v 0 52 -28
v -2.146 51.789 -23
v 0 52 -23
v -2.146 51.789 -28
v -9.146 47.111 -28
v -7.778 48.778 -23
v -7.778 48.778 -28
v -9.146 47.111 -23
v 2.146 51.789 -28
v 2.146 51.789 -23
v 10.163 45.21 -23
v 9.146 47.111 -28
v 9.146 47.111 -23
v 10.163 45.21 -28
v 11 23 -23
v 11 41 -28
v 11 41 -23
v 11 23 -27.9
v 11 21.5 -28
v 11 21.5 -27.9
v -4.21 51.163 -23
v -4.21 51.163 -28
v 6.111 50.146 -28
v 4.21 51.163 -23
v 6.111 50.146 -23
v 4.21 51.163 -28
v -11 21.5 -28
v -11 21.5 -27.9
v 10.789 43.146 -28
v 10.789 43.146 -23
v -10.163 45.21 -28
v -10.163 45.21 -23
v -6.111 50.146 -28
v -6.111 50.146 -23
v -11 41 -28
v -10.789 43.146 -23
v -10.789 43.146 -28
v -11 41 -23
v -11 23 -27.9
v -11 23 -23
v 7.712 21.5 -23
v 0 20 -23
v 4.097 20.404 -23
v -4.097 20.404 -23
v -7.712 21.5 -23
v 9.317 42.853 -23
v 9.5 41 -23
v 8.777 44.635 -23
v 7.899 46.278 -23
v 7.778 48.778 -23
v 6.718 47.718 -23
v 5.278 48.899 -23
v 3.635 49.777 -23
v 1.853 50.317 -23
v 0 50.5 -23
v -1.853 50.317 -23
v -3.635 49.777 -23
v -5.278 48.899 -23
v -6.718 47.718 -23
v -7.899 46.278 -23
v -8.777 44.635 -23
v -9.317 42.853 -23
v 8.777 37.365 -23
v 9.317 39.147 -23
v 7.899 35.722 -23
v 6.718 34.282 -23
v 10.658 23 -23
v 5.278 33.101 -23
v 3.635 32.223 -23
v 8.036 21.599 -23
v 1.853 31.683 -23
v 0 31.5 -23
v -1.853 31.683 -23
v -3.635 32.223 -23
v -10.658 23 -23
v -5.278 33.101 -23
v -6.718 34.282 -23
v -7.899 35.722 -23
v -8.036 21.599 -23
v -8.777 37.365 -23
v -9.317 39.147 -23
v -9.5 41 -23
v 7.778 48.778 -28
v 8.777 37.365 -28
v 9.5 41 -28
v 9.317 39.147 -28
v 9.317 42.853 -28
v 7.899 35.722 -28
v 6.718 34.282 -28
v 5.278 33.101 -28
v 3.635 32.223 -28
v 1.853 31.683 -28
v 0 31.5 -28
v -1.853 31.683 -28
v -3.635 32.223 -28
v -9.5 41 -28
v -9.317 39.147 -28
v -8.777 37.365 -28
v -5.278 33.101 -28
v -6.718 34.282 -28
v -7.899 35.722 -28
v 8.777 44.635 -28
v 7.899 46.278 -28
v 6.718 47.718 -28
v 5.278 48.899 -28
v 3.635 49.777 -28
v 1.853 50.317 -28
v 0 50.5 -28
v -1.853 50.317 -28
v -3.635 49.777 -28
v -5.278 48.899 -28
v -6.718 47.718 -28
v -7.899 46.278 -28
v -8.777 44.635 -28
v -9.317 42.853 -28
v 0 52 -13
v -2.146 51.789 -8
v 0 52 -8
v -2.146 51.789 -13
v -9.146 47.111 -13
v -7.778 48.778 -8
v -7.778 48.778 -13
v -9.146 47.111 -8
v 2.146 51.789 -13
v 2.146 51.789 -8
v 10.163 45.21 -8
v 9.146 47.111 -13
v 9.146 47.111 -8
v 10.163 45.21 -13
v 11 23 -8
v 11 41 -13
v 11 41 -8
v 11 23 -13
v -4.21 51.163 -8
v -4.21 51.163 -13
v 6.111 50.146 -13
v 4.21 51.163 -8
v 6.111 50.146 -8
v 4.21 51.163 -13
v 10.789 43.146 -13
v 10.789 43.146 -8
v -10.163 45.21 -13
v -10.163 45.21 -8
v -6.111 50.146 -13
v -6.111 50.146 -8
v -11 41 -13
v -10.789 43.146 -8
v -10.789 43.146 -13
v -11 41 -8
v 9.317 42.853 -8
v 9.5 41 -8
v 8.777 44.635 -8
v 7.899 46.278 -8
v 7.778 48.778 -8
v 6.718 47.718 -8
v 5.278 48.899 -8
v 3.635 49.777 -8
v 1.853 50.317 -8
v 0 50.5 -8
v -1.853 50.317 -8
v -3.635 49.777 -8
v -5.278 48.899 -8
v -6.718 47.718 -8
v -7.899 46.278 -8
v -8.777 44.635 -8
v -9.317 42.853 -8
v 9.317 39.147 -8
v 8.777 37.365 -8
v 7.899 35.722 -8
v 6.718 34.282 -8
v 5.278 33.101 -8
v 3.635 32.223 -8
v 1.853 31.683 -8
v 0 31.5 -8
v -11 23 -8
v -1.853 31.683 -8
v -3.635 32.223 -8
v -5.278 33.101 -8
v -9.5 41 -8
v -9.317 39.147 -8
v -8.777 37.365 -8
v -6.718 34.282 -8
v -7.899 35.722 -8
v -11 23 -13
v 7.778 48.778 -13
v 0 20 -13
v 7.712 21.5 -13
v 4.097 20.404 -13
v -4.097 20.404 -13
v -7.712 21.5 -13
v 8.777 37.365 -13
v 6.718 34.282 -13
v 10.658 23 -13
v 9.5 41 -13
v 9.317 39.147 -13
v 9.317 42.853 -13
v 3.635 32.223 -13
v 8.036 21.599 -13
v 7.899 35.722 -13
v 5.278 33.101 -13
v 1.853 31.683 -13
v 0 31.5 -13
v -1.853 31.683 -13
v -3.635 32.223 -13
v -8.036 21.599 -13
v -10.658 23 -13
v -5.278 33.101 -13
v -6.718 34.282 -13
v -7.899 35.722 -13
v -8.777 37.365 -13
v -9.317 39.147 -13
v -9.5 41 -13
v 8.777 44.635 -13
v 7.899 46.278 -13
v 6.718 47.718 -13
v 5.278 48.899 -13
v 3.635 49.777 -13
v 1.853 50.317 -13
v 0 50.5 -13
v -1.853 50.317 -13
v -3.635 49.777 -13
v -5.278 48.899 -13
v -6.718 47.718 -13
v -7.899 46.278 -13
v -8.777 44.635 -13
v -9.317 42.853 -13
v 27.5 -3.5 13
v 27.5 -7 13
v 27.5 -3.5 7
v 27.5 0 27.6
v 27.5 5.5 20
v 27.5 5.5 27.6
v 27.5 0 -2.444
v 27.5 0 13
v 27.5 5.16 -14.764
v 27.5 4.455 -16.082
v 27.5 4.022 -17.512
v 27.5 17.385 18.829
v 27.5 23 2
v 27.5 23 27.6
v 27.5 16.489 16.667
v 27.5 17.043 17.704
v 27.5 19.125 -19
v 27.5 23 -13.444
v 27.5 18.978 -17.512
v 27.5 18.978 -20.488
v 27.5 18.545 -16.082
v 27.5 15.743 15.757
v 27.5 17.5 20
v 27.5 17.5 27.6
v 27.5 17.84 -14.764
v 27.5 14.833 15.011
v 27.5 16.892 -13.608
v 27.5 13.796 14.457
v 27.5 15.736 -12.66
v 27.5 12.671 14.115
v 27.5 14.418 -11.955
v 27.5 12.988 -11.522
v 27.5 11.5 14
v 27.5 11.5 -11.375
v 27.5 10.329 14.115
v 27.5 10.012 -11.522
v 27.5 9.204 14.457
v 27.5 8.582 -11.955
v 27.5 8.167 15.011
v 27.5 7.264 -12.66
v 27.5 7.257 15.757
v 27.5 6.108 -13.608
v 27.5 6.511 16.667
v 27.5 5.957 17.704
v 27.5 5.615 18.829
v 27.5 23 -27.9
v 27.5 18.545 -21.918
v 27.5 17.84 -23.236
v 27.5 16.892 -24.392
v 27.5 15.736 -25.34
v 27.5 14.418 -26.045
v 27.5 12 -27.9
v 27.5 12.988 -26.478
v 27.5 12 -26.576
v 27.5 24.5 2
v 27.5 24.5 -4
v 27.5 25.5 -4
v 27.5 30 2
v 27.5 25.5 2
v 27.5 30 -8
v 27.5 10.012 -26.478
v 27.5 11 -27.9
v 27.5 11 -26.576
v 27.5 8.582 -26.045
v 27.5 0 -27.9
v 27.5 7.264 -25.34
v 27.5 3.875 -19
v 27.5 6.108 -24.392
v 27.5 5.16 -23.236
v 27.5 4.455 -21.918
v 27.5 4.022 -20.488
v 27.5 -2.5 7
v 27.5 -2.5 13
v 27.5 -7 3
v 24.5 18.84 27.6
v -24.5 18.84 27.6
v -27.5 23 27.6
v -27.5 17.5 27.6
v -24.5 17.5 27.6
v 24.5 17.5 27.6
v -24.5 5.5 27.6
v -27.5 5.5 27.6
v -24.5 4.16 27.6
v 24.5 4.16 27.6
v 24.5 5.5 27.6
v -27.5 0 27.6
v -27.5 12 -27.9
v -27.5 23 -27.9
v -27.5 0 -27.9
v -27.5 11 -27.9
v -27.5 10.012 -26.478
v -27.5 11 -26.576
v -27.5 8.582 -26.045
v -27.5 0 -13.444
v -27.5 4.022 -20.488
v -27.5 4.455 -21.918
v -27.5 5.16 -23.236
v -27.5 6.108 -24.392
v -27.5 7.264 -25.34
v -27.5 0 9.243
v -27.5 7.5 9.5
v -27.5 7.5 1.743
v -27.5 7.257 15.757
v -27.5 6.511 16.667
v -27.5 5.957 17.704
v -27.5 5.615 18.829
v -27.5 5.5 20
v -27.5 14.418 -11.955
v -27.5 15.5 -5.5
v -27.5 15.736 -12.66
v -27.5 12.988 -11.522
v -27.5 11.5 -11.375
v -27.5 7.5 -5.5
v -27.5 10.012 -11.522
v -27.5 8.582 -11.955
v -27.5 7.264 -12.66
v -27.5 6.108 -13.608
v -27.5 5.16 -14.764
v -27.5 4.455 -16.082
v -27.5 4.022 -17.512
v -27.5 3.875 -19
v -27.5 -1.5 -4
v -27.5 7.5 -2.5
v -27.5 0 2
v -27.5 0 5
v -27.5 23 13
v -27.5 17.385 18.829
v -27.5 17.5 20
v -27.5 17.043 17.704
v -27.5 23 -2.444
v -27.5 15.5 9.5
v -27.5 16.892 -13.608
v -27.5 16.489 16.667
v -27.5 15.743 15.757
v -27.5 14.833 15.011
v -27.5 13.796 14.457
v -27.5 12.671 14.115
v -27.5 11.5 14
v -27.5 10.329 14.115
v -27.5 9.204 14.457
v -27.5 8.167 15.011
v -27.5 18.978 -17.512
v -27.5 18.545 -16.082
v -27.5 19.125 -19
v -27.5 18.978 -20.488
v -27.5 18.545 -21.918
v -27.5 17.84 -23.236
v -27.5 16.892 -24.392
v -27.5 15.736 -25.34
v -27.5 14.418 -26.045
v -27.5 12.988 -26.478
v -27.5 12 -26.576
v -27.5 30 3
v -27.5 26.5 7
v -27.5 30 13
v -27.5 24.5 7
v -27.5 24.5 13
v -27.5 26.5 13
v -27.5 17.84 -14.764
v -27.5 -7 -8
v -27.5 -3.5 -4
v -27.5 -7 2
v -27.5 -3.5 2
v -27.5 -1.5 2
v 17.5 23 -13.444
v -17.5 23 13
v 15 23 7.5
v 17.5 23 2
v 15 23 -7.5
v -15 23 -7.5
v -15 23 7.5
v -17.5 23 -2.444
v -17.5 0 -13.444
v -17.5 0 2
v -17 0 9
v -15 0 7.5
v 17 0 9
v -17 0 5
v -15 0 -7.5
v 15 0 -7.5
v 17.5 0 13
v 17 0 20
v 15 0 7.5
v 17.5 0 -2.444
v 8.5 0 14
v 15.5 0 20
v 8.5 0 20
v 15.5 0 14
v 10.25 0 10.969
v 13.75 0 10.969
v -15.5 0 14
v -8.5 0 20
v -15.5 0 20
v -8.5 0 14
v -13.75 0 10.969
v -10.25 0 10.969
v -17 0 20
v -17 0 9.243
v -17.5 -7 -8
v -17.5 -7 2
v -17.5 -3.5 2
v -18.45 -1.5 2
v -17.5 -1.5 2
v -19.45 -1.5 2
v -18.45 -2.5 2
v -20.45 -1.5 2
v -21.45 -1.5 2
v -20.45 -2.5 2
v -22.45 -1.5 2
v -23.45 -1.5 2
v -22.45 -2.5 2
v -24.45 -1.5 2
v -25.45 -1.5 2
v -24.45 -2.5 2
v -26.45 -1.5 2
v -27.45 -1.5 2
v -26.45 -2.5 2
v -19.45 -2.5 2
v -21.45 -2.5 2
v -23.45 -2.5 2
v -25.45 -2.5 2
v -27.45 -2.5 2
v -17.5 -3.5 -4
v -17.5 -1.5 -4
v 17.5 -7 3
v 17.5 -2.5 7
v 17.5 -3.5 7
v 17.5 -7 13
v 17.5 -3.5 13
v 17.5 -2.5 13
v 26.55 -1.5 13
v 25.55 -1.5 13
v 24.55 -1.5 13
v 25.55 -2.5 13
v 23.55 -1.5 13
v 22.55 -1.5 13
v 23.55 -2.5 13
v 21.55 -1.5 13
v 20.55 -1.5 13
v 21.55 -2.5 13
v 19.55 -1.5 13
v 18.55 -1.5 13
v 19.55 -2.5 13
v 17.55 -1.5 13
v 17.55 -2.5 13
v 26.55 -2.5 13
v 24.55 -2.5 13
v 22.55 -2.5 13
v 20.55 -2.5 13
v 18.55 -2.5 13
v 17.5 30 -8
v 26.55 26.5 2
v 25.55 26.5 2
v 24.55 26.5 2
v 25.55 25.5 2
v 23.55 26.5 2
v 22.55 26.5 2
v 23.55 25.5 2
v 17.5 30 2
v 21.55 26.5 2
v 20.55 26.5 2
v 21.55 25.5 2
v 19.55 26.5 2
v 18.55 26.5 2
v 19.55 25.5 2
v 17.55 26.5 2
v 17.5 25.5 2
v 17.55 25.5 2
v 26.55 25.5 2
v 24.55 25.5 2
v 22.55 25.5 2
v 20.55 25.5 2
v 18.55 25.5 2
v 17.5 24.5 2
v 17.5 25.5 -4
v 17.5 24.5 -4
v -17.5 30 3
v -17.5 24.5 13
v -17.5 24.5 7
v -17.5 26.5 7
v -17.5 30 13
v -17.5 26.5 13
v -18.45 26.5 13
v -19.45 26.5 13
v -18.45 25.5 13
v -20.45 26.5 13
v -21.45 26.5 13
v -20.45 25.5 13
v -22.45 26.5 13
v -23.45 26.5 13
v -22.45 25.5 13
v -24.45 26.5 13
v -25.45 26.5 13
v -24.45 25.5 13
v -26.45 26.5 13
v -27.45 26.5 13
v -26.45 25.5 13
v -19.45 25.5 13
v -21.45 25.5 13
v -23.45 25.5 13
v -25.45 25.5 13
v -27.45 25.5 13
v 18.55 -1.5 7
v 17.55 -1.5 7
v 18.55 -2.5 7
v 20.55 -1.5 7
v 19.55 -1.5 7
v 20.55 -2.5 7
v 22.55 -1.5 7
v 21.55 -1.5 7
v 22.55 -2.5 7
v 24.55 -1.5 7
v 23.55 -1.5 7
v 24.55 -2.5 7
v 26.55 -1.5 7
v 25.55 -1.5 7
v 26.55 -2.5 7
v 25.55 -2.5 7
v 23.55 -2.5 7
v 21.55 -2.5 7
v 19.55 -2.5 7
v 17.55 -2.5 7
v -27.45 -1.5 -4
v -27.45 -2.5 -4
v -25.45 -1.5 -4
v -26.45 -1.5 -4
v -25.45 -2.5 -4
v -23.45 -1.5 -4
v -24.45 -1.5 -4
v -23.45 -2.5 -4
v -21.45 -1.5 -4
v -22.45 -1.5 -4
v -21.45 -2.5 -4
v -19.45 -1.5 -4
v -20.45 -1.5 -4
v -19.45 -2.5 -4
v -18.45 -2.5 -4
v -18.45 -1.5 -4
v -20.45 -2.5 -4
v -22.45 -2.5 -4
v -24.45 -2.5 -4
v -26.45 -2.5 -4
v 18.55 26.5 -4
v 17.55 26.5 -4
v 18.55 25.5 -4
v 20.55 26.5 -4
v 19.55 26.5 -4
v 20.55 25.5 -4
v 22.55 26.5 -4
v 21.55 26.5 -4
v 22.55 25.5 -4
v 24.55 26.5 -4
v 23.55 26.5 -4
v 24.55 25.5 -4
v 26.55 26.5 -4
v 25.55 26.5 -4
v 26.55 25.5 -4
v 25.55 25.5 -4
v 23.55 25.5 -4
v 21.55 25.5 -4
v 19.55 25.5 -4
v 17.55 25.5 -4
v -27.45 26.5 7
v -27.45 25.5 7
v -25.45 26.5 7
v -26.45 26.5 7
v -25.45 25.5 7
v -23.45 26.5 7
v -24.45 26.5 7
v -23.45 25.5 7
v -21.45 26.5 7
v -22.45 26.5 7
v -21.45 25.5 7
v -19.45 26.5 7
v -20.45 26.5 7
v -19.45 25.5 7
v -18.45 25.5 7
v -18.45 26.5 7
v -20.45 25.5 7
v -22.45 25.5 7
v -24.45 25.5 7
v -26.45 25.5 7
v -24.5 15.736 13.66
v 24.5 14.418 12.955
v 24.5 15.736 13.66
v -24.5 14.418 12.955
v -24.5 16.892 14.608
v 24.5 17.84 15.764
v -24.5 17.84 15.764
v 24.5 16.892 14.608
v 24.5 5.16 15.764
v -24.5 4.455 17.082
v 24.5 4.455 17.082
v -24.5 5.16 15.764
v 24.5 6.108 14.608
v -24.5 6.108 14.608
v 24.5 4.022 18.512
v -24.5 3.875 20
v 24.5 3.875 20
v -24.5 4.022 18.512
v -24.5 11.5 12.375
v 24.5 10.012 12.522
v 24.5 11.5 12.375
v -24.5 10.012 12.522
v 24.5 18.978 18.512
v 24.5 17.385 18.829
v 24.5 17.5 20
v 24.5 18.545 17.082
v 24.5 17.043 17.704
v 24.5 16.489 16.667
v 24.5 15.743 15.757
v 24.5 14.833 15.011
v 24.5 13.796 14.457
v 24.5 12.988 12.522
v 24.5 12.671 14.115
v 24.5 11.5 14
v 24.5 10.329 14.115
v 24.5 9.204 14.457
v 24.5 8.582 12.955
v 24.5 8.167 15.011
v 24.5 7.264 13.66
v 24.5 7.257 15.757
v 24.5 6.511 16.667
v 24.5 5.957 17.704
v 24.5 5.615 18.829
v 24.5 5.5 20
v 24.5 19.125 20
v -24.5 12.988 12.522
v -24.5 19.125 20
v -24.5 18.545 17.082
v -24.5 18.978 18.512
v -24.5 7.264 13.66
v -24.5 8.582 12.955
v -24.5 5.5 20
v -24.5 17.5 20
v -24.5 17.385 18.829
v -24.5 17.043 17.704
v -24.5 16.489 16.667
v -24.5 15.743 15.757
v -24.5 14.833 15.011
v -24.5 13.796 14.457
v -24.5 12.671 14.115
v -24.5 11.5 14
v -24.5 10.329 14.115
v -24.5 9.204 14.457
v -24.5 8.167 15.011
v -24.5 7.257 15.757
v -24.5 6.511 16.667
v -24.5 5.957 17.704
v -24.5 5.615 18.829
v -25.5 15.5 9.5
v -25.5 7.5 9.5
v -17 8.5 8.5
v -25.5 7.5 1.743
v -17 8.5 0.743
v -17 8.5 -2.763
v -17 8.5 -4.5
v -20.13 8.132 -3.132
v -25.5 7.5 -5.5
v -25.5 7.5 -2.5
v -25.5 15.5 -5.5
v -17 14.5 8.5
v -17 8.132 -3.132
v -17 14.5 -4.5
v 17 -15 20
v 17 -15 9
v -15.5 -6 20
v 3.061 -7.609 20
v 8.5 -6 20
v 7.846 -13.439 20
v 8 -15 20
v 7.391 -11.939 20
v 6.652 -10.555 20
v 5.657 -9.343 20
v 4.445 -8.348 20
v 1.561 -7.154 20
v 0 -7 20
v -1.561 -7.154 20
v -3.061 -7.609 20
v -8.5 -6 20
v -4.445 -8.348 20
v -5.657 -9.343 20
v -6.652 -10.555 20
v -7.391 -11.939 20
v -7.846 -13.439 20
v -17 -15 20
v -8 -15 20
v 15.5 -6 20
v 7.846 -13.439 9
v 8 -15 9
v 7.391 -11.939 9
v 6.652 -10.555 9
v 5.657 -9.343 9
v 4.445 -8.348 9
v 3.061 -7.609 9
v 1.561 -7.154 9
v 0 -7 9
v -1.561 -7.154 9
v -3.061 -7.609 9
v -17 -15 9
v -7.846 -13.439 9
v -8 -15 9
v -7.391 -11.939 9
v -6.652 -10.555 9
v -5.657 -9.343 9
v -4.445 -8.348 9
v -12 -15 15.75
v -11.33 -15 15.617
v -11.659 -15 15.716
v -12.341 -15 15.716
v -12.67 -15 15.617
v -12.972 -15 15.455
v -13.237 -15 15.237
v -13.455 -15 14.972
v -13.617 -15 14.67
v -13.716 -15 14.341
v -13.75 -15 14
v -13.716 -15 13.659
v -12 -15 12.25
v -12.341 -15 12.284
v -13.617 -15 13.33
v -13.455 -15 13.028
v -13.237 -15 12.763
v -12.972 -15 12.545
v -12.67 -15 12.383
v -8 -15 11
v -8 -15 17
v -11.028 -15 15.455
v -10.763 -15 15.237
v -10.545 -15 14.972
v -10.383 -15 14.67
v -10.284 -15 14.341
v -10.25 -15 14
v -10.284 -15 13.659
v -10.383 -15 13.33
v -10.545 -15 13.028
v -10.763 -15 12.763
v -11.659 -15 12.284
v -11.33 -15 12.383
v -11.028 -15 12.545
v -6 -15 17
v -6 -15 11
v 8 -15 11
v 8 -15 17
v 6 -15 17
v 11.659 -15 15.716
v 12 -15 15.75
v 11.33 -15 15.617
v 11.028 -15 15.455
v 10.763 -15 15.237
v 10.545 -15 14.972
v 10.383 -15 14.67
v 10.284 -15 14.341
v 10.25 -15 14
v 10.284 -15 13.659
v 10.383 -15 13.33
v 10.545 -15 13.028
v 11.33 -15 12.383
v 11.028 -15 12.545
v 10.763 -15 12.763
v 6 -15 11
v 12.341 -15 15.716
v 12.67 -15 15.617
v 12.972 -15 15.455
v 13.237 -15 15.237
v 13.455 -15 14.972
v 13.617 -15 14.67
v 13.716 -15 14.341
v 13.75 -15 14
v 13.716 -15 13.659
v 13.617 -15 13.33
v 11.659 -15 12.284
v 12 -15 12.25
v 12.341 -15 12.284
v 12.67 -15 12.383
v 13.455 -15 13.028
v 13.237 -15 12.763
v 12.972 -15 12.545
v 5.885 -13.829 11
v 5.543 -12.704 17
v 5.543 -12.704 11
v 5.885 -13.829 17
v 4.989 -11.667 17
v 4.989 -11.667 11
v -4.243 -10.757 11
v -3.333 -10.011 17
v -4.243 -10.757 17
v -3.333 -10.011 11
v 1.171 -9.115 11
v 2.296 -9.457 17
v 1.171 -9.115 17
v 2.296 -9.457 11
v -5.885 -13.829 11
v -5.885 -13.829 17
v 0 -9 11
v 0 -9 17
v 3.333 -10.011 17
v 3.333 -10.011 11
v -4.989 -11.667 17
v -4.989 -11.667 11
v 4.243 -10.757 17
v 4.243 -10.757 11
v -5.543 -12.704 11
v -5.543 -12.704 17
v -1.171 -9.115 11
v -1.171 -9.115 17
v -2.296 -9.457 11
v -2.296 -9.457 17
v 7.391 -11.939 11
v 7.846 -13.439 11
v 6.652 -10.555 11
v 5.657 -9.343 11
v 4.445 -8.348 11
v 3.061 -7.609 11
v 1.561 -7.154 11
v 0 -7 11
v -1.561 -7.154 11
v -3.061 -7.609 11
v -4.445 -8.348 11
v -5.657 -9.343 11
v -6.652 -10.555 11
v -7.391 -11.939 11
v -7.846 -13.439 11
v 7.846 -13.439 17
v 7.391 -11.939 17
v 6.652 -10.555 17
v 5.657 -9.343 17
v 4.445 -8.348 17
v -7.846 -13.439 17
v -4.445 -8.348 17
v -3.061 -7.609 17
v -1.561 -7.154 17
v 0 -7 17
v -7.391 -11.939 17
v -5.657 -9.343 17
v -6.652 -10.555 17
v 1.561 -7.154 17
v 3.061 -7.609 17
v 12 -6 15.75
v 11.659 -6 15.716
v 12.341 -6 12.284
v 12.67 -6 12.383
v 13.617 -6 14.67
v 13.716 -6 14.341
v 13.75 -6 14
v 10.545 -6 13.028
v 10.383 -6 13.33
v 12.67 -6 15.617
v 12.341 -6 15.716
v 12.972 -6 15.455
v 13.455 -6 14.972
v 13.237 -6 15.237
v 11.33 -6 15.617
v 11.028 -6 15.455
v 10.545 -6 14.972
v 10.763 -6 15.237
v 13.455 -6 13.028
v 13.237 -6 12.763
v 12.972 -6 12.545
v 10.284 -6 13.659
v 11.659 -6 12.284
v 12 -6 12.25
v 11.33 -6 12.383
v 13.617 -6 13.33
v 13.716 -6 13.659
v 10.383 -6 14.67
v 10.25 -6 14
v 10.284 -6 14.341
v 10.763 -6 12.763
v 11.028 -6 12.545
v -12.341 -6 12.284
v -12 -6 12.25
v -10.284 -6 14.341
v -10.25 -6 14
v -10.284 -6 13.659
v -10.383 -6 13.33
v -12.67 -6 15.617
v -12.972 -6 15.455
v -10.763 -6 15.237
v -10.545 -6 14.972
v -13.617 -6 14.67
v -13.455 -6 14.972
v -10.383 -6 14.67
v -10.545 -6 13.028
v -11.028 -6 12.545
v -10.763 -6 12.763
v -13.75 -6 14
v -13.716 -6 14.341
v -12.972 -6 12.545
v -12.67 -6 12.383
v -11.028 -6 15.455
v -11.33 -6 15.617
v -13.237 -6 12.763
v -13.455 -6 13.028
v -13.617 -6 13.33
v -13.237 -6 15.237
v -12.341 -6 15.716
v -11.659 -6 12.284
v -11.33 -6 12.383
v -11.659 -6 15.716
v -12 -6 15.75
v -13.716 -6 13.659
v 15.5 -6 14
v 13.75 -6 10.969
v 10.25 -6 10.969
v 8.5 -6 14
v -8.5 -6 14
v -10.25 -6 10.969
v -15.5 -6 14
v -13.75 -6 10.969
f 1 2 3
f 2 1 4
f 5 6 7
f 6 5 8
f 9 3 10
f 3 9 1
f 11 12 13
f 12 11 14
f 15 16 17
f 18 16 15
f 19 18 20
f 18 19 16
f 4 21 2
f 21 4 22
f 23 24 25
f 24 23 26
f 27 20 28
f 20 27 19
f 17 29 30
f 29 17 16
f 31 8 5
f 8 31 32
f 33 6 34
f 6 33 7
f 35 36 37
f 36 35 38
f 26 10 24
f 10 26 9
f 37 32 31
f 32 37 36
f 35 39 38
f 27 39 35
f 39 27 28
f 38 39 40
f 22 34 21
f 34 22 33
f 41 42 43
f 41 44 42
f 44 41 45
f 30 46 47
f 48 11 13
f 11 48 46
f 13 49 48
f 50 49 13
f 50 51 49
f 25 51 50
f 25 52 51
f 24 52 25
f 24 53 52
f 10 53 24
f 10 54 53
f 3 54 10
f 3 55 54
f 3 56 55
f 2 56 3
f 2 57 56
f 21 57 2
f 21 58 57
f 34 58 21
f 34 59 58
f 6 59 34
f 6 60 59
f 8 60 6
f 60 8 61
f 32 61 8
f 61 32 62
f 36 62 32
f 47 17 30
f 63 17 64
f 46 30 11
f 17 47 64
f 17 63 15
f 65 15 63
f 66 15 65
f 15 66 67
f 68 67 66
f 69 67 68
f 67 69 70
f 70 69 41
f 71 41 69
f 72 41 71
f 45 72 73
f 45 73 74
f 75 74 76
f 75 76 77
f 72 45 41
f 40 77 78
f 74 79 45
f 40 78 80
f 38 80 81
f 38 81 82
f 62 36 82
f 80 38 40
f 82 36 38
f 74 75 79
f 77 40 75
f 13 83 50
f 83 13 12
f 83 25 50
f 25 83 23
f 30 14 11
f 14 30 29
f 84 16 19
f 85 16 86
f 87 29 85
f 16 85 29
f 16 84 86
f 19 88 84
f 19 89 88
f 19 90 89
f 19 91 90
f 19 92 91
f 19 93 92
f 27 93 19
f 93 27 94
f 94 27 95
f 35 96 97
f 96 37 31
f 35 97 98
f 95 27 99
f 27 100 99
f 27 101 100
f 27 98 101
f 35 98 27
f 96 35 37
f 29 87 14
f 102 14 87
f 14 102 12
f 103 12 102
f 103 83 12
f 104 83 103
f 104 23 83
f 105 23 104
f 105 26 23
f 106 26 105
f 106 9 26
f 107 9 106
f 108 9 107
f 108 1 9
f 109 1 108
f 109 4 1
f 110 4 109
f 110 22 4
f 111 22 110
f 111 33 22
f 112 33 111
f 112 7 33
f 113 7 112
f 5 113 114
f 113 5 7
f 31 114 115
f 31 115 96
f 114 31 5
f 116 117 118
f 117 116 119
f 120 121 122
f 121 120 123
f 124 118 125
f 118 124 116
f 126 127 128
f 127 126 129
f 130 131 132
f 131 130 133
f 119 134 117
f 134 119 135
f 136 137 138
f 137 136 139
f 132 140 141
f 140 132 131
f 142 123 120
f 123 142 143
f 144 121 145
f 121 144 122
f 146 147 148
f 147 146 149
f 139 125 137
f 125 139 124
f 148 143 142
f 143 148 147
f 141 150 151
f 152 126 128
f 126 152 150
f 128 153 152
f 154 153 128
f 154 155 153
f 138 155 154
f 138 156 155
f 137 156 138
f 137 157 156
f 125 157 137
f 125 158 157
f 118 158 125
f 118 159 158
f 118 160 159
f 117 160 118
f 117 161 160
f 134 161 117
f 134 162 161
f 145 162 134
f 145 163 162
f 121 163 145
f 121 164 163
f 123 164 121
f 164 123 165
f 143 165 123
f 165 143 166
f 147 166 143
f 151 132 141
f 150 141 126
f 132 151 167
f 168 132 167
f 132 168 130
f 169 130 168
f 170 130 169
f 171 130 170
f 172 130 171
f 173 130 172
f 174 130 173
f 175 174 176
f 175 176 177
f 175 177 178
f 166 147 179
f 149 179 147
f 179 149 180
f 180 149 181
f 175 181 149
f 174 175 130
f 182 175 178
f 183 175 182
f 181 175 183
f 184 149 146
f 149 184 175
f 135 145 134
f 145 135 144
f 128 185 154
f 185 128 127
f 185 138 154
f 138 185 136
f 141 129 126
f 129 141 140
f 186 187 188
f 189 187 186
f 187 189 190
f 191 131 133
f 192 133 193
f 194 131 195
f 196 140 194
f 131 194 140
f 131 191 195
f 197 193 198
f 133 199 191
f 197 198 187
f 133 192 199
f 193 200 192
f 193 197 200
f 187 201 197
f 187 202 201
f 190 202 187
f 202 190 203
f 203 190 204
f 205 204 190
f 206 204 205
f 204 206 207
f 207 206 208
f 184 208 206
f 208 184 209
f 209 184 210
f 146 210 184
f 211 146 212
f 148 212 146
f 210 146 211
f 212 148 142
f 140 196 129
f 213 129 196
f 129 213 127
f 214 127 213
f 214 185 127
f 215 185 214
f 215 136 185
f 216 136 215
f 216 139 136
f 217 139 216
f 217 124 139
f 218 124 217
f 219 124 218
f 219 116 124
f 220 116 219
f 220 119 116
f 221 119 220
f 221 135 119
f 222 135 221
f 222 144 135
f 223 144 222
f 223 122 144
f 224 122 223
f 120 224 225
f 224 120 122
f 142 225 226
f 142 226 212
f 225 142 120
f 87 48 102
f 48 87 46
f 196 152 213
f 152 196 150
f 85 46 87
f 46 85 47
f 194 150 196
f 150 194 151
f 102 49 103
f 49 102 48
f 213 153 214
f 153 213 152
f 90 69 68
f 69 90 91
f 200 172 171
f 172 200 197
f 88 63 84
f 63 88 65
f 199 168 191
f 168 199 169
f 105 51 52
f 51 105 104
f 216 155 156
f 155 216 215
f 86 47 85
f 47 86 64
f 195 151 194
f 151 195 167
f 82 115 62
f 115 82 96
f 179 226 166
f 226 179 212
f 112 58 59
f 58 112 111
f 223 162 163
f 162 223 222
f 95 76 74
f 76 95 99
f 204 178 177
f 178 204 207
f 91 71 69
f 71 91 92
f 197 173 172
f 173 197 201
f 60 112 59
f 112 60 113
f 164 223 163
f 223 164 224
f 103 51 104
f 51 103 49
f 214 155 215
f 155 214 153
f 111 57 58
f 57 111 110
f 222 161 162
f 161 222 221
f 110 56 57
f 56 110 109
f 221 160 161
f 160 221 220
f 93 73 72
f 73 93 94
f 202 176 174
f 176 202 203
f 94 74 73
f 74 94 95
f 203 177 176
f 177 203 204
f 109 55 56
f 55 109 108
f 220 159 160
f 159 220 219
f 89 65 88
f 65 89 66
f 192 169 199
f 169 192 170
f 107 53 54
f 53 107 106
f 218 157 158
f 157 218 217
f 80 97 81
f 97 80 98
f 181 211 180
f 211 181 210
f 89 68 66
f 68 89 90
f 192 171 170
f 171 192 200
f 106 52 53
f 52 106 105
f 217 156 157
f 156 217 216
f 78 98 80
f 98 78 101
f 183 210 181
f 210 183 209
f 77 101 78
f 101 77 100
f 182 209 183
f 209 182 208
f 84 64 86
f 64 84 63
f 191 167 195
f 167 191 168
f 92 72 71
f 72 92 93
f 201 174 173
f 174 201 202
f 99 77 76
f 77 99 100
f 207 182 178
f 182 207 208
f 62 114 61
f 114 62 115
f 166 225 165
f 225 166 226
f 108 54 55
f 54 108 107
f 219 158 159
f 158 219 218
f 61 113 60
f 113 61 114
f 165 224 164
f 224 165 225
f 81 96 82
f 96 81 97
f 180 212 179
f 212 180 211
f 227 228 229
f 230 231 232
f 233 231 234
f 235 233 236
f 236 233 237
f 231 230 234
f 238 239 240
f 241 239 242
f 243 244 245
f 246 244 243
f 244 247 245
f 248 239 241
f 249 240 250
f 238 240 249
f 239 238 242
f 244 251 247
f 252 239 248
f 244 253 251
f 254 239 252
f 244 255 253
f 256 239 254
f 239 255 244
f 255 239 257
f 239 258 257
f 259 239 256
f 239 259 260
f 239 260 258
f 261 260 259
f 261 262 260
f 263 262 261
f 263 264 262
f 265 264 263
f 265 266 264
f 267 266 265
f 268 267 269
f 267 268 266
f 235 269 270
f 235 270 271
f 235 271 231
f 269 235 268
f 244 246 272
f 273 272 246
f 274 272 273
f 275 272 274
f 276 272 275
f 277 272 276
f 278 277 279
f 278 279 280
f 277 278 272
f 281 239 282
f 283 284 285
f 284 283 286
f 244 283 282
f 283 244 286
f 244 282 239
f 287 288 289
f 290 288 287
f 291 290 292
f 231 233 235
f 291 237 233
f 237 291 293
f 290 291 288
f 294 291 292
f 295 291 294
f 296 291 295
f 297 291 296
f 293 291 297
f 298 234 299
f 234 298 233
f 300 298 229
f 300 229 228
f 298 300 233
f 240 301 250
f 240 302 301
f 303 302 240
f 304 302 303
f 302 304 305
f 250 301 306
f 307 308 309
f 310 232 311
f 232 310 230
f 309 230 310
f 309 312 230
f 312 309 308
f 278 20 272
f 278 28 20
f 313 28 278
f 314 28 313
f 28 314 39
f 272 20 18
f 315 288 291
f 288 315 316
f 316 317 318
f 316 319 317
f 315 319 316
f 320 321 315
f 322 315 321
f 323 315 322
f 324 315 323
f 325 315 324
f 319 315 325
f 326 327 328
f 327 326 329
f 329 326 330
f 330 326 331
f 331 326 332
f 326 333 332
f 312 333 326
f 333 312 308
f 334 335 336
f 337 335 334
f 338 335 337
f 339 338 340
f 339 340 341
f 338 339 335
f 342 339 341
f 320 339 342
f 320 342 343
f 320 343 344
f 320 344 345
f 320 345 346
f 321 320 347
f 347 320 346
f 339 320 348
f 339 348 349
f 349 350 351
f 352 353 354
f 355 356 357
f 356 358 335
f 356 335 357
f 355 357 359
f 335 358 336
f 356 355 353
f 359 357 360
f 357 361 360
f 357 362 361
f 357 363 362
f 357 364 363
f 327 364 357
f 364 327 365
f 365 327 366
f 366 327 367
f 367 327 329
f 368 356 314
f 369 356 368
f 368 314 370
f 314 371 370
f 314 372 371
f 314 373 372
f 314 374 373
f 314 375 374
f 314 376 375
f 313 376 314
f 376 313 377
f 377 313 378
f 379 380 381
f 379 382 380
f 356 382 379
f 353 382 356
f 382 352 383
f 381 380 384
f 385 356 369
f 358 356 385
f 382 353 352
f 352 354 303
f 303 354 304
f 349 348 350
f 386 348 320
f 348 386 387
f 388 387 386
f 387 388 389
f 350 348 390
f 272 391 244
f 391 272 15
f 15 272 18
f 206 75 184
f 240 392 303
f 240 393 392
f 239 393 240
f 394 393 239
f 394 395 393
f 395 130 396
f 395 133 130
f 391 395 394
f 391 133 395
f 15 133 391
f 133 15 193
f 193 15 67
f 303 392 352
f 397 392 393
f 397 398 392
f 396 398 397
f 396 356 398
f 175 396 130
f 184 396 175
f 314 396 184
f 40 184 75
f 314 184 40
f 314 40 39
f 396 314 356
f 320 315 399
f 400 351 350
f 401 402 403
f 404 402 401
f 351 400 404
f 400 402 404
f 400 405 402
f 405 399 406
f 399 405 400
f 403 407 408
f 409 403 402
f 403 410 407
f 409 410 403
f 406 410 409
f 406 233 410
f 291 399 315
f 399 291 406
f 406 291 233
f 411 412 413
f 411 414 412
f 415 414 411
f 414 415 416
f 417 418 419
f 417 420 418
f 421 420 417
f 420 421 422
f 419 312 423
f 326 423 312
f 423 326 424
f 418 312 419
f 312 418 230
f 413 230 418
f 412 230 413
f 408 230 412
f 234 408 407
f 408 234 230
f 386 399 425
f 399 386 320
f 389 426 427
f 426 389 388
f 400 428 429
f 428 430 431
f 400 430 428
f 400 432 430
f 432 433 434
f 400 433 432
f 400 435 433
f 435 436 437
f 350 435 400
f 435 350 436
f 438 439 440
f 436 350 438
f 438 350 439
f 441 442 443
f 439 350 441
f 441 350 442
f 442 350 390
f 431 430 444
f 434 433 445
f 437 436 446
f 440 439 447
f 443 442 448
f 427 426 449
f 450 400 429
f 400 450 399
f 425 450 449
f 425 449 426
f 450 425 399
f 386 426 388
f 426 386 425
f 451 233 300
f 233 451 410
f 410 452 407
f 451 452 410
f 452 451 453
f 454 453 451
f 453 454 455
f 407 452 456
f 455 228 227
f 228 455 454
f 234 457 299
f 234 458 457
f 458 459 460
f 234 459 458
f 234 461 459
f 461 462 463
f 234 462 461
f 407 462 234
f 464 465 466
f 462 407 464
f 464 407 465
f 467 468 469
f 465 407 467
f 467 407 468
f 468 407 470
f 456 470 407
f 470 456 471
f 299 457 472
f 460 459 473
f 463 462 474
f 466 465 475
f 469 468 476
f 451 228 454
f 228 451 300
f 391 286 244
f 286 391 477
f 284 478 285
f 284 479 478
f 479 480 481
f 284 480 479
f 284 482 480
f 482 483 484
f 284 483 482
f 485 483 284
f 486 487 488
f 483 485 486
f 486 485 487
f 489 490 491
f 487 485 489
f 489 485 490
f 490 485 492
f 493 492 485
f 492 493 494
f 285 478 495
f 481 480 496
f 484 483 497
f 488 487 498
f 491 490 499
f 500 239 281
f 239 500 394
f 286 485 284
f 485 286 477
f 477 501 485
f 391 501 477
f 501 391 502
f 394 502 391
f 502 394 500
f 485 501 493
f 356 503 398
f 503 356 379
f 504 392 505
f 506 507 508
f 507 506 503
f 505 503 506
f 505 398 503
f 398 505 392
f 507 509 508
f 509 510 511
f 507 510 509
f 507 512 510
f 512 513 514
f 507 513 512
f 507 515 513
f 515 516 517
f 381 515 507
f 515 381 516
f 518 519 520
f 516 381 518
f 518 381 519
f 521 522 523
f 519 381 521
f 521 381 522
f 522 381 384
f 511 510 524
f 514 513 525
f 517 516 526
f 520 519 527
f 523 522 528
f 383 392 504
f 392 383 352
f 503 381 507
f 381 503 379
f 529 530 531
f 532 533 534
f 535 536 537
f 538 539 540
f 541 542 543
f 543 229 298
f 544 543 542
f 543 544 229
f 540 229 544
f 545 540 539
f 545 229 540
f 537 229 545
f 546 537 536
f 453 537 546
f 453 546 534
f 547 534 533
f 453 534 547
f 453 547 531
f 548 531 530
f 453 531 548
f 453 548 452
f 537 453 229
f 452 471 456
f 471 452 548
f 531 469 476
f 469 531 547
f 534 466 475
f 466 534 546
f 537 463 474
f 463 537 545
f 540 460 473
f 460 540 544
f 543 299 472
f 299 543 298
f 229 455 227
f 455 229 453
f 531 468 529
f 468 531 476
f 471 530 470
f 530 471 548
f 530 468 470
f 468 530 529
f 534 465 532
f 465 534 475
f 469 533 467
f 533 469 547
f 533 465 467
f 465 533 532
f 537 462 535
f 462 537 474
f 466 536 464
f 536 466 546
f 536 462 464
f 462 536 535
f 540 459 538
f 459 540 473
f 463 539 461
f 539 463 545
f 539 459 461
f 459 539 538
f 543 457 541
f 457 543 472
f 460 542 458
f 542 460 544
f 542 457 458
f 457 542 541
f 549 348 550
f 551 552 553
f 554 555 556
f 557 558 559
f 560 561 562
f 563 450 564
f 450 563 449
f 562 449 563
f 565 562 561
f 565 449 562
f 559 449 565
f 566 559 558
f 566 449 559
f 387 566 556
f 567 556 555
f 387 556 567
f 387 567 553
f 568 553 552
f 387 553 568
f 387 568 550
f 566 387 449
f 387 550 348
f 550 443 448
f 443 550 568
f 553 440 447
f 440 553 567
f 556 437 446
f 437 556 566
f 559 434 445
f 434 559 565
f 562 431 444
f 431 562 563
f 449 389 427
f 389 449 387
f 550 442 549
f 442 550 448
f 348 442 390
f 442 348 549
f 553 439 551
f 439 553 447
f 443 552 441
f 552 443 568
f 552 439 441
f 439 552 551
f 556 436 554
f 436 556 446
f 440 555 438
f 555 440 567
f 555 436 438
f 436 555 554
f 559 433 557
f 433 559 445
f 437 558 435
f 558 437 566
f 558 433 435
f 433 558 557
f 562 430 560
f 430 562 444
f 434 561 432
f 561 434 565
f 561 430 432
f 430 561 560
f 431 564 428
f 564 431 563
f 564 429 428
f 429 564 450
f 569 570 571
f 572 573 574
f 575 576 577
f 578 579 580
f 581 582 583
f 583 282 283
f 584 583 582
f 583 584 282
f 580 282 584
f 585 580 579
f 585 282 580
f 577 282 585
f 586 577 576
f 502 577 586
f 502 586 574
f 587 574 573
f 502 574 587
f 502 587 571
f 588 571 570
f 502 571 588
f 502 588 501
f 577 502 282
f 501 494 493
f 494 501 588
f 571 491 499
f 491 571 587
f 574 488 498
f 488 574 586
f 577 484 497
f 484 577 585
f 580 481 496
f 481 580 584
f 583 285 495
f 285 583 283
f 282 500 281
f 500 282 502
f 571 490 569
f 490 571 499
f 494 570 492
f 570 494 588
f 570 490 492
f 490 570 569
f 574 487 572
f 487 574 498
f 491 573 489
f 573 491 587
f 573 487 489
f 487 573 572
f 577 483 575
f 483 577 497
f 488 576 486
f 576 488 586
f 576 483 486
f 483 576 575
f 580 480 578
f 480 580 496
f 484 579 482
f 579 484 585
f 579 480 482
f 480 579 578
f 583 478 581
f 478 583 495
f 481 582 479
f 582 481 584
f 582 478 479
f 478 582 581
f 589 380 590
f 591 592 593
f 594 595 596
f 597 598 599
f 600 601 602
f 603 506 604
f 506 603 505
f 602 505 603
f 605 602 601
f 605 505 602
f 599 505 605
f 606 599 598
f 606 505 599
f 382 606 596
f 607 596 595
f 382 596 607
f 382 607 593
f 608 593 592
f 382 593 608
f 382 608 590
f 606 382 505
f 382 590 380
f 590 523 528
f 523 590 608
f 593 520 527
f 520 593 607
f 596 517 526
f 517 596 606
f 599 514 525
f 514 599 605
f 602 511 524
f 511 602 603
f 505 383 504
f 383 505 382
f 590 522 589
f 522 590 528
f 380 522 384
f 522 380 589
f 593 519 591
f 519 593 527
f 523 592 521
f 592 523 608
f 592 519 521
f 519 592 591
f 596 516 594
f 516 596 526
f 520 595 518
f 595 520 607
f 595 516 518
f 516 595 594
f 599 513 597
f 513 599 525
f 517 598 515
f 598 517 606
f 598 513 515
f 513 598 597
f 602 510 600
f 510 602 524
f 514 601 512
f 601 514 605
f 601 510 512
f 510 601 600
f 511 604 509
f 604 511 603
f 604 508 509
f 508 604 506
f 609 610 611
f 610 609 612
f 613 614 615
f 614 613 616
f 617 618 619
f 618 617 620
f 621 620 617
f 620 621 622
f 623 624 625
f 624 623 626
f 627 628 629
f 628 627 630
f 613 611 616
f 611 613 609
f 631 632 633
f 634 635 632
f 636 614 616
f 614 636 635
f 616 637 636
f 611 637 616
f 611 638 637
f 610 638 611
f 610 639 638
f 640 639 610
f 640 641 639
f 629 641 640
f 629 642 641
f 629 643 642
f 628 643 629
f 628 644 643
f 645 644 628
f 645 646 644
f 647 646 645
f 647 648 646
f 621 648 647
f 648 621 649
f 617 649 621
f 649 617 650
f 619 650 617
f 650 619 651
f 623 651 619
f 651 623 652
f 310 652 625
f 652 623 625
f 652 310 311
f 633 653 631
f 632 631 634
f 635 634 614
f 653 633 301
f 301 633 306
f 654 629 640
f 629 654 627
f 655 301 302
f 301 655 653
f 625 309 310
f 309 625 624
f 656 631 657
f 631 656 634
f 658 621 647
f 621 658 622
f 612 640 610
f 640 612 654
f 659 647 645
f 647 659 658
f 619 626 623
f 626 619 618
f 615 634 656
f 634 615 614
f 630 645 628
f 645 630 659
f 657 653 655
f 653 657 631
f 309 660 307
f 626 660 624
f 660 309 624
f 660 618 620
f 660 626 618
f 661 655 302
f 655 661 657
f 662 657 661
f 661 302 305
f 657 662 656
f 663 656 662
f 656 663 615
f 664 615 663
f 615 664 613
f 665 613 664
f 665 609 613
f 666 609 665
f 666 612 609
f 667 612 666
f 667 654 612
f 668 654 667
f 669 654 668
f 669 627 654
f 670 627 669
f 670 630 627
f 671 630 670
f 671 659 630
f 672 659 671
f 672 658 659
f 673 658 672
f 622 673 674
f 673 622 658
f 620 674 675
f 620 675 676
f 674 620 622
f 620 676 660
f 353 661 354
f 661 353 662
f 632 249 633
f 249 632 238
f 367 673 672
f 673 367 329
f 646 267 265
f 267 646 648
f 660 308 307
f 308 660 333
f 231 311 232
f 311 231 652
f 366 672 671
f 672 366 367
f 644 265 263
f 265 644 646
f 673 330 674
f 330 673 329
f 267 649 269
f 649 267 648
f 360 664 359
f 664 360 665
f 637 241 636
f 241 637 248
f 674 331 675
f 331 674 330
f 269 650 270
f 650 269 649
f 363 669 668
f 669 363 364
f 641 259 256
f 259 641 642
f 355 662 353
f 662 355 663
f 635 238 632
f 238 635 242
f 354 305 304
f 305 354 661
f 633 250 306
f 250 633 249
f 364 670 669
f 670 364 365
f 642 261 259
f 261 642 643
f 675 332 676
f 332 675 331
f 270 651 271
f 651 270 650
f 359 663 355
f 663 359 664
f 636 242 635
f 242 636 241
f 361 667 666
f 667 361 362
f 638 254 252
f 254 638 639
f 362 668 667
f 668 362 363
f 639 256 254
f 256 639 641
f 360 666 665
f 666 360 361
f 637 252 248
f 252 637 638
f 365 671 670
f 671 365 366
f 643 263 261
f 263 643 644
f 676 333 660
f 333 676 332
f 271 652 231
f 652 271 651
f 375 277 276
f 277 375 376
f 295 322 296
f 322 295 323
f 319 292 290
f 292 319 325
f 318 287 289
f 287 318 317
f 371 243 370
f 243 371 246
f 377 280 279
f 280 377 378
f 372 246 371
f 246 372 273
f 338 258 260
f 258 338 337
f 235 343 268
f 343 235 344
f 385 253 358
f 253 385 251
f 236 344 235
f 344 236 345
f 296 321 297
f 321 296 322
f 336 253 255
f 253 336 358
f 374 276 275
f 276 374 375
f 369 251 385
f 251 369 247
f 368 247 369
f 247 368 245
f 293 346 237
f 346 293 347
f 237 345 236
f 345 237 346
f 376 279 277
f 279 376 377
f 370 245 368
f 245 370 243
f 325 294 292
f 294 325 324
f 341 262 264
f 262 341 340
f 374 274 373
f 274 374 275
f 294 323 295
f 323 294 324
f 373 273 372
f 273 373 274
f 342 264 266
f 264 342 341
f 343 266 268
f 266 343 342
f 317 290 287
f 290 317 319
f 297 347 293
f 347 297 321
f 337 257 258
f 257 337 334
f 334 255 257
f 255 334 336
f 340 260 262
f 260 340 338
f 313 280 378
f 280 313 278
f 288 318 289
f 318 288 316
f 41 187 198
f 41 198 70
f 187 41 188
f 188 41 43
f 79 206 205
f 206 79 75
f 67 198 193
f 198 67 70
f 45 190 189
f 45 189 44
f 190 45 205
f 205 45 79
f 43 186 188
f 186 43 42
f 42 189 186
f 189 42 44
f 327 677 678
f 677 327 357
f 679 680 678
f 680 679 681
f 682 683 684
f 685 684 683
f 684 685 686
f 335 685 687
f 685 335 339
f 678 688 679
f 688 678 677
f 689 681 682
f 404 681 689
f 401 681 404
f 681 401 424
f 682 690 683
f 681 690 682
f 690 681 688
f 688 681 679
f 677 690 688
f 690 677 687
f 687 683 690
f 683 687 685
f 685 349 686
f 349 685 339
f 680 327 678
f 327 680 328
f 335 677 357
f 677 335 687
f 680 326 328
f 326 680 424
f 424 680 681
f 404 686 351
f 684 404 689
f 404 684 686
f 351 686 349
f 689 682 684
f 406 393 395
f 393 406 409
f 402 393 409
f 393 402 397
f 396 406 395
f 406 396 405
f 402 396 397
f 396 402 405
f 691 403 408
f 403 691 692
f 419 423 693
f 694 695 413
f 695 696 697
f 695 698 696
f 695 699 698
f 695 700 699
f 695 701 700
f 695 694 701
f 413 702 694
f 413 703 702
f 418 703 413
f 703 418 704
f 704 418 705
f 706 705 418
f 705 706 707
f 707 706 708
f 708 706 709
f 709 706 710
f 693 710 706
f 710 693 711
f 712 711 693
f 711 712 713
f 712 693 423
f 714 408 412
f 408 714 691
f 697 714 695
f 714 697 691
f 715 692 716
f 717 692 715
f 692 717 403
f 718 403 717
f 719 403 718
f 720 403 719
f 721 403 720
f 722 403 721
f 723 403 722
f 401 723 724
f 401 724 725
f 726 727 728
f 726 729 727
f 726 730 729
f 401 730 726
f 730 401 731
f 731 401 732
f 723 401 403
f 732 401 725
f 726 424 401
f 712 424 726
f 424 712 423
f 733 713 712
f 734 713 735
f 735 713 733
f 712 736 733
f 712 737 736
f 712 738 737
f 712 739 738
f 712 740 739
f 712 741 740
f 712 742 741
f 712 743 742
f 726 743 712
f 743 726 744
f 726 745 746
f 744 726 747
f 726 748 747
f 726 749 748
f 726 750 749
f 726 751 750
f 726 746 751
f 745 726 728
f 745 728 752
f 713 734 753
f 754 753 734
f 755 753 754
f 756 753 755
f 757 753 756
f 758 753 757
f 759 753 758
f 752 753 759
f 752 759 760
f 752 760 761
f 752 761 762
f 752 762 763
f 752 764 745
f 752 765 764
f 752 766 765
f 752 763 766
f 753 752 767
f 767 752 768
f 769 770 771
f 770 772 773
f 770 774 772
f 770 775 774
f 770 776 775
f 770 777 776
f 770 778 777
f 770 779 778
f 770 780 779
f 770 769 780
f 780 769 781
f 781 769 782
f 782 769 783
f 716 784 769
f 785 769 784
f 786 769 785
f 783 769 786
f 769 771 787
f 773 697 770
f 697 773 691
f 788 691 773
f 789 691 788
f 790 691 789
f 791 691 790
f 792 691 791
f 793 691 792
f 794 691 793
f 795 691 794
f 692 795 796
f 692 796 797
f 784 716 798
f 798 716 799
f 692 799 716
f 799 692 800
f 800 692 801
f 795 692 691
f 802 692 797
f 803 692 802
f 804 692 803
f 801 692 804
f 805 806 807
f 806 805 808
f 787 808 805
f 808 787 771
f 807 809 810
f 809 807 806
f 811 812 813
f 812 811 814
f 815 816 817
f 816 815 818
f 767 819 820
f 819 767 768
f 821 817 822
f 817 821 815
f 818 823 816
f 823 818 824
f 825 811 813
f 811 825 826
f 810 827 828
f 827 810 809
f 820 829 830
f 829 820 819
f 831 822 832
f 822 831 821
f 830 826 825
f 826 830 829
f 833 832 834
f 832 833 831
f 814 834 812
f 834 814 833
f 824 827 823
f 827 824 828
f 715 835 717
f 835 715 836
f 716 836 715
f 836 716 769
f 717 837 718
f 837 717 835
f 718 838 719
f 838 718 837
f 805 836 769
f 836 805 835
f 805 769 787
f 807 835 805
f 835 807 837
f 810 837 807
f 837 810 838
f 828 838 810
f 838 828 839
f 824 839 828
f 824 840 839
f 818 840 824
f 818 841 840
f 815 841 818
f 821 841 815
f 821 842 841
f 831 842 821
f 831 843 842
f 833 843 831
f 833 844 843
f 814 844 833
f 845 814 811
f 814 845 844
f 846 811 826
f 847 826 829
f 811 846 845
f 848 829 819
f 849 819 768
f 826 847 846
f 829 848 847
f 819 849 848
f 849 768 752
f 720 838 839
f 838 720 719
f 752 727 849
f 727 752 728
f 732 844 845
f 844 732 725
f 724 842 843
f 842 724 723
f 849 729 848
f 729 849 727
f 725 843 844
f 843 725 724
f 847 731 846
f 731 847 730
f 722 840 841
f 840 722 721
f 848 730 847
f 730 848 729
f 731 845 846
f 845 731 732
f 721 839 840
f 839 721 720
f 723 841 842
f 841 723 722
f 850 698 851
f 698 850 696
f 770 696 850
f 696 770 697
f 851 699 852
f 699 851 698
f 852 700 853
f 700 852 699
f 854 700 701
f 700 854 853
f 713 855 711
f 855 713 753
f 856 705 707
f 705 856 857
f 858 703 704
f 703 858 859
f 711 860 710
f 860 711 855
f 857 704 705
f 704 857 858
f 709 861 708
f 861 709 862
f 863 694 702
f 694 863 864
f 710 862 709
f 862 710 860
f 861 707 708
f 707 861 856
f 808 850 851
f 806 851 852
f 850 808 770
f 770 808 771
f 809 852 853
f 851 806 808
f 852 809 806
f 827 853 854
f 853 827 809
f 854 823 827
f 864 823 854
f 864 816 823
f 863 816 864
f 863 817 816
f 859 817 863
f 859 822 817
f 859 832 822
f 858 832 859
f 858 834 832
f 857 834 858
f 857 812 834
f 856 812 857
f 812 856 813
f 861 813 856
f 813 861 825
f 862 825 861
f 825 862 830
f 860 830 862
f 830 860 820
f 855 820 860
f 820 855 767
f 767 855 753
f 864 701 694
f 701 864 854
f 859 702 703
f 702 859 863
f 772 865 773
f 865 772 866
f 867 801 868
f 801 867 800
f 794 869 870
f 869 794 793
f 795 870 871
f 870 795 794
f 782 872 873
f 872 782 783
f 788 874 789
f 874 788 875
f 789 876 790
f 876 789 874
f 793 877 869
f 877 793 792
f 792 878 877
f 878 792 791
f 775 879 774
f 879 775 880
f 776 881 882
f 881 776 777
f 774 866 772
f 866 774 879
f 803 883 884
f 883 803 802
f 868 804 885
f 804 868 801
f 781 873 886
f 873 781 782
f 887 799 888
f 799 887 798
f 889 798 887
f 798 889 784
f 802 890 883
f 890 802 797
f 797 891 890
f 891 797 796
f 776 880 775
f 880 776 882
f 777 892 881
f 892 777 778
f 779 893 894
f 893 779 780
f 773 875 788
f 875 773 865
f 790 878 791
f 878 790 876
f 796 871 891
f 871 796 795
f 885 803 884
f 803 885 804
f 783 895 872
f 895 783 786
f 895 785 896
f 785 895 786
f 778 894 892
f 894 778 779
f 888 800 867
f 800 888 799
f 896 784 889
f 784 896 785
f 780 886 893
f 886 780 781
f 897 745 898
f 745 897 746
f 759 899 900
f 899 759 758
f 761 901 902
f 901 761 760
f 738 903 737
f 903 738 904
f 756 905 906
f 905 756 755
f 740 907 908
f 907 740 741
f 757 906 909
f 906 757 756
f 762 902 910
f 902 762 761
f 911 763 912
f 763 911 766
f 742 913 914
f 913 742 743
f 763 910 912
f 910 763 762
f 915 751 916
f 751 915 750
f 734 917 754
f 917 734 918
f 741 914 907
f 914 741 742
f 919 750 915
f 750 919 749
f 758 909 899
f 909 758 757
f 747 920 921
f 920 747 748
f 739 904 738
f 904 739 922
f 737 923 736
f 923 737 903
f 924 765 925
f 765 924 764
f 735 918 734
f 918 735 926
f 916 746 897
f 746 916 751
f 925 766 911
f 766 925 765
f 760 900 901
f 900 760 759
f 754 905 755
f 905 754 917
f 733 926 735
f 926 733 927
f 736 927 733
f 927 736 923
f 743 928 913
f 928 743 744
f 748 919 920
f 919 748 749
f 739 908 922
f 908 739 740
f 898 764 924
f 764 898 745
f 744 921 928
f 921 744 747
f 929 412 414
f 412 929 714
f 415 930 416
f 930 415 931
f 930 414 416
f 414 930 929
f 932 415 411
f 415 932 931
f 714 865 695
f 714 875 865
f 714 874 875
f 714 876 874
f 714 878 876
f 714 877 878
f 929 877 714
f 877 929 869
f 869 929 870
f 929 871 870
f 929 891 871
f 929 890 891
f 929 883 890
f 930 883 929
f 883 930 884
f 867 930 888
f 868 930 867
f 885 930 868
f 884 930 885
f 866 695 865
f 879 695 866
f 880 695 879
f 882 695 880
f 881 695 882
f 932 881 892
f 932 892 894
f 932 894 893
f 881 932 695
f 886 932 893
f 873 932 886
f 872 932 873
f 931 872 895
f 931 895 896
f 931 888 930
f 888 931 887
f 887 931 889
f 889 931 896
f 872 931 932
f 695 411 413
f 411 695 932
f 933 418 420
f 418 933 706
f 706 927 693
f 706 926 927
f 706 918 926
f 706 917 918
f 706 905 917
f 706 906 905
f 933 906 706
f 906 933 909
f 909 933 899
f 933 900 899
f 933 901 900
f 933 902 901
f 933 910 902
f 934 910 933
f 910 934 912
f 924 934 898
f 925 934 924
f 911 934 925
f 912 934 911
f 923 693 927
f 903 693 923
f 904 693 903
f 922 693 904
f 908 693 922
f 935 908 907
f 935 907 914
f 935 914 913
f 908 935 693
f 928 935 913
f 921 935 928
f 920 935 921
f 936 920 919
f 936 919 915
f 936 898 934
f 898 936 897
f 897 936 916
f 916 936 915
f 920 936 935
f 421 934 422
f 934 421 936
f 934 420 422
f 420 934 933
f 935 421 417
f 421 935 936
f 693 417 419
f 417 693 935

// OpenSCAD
$fn=32;

//translate([160.9,-8,-28])import("limpio carriage.stl",convexity=10);
/*
difference(){
translate([160.9,-8,-28])import("limpio carriage.stl",convexity=10);
difference(){

//translate([0,20,20])cube(40,center=true);
}
translate([0,0,-1.5])

rotate([90,0,0]){
translate([11.5,11.5,0])cylinder(r=4/2,h=60,center=true);
    
    translate([-11.5,11.5,0])cylinder(r=4/2,h=60,center=true);
    translate([11.5,-11.5+4,0])cylinder(r=4/2,h=60,center=true);
    translate([-11.5,-11.5+4,0])cylinder(r=4/2,h=60,center=true);
    translate([11.5,-11.5+17,0])cylinder(r=4/2,h=60,center=true);
    translate([-11.5,-11.5+17,0])cylinder(r=4/2,h=60,center=true);
    translate([11.5,-11.5+10,0])cylinder(r=4/2,h=60,center=true);
    translate([-11.5,-11.5+10,0])cylinder(r=4/2,h=60,center=true);
}
translate([37/2,0,-40])
rotate([0,0,180])
color("red")cube([37,20,80]);
}
*/


/*
difference(){
union(){
//translate([0,-30,5.5+10]) rotate([180,0,-90])import("diamond_cooler_shield_blower_fixed_05.stl");
//translate([0,0,10])cube([43,3,43],center=true);
} 
translate([-24,-6,-6])cube([8,6,50]);
translate([16,-6,5])cube([8,6,50]);
    translate([0,-5,29.5])rotate([45,0,0])cube([70,20,20],center=true);
}
*/
//translate([0,61-25,0])cylinder(r=8,h=150,$fn=16,center=true);



difference(){
union(){
hull(){
translate([0,61-25+5,-28])cylinder(r=22/2,h=5);
translate([0,22,-28+2.5])cube([22,1,5],center=true);
}
translate([0,0,15])
hull(){
translate([0,61-25+5,-28])cylinder(r=22/2,h=5);
translate([0,22,-28+2.5])cube([22,1,5],center=true);
}}

translate([0,61-25+5,-30])cylinder(r=19/2,h=50);
}
difference(){
union(){
translate([0,11.5,-2.65+5/2])cube([55,23,50.5+5],center=true);
hull(){
translate([-22.5,-2,-3])cube([10,10,10],center=true);
translate([-22.5,2.5,-3-7])cube([10,1,10],center=true);
}
translate([45,0,11])
hull(){
translate([-22.5,-2,-3])cube([10,10,10],center=true);
translate([-22.5,2.5,-3-7])cube([10,1,10],center=true);
}
translate([0,23,0])
rotate([0,0,180])
hull(){
translate([-22.5,-2,-3])cube([10,10,10],center=true);
translate([-22.5,2.5,-3-7])cube([10,1,10],center=true);
}
translate([-45,23,11])
rotate([0,0,180])
hull(){
translate([-22.5,-2,-3])cube([10,10,10],center=true);
translate([-22.5,2.5,-3-7])cube([10,1,10],center=true);
}
}
hull(){
    translate([0,11.5,20])rotate([0,90,0])cylinder(r=15.25/2,h=24*2+1,center=true);
    translate([0,11.5,30])rotate([0,90,0])cylinder(r=14.5/2,h=24*2+1,center=true);
}
hull(){
    translate([0,11.5,20])rotate([0,90,0])cylinder(r=12/2,h=80,center=true);
    translate([0,11.5,30])rotate([0,90,0])cylinder(r=12/2,h=80,center=true);
}
translate([0,11.5,-19])rotate([0,90,0])cylinder(r=15.25/2,h=80,center=true);

translate([0,0,-3])agarrecorrea();
translate([-46,0,-11-3])agarrecorrea();

translate([0,28,-11-3])agarrecorrea();
translate([-46,28,-3])agarrecorrea();
translate([0,3+17/2,-25])cube([100,1,10],center=true);
translate([0,61-25+5,-20.5-2.5])cylinder(r=21,h=10);

translate([8,0,0])
hull(){
translate([-30,11.5,2])color("red")cube([10,6,13],center=true);
translate([-30-5,11.5,2])color("red")cube([3,8,15],center=true);
}
translate([8,0,5])rotate([-45,0,0])translate([-40,-3.5,0])cube([15,15,3]);
cube([30,50,15],center=true);
}

module agarrecorrea(){

translate([0.55,0,-1]){
color("blue")
translate([15,-7+3.5,11])
cube([15,1,10]);

color("blue")translate([15,-7+3.5+0.5,11])cube([1,1.5,10]);
color("blue")translate([15+2,-7+3.5+0.5,11])cube([1,1.5,10]);
color("blue")translate([15+4,-7+3.5+0.5,11])cube([1,1.5,10]);
color("blue")translate([15+6,-7+3.5+0.5,11])cube([1,1.5,10]);
color("blue")translate([15+8,-7+3.5+0.5,11])cube([1,1.5,10]);
color("blue")translate([15+10,-7+3.5+0.5,11])cube([1,1.5,10]);
color("blue")translate([15+12,-7+3.5+0.5,11])cube([1,1.5,10]);
color("blue")translate([15+14,-7+3.5+0.5,11])cube([1,1.5,10]);
}
}

difference(){
    translate([0,-7.5,14.5])color("red")cube([34,15,11],center=true);

    translate([0,-15,0])cylinder(r=6,h=30);
    translate([0,-15,1])cylinder(r=8,h=10);
    translate([0,-15,1+10+6])cylinder(r=8,h=10);

    translate([12,1,14])rotate([90,0,0])cylinder(r=3.5/2,h=30);
    translate([-12,1,14])rotate([90,0,0])cylinder(r=3.5/2,h=30);

    hull(){
        translate([12,1,14])rotate([90,0,0])cylinder(r=7/2,h=7,$fn=6);
        translate([12,1,30])rotate([90,0,0])cylinder(r=7/2,h=7,$fn=6);
    }
    hull(){
        translate([-12,1,14])rotate([90,0,0])cylinder(r=7/2,h=7,$fn=6);
        translate([-12,1,30])rotate([90,0,0])cylinder(r=7/2,h=7,$fn=6);
    }
}



/*
translate([0,-30-20+50,-15])
rotate([0,0,180])
translate([0,-20,15])
difference(){
    translate([0,-7.5+3,14.5])color("red")cube([34,12+5,11],center=true);

    translate([0,-15,0])cylinder(r=6,h=30);
    translate([0,-15,1])cylinder(r=8,h=10);
    translate([0,-15,1+10+6])cylinder(r=8,h=10);
    hull(){
        translate([0,0,14])rotate([90,0,0])cylinder(r=7/2,h=5,$fn=6);
        translate([0,0,0+5])rotate([90,0,0])cylinder(r=7/2,h=5,$fn=6);
    }
    translate([0,0,14])rotate([90,0,0])cylinder(r=4/2,h=40,center=true);
    translate([12,1,14])rotate([90,0,0])cylinder(r=3.5/2,h=100,center=true);
    translate([-12,1,14])rotate([90,0,0])cylinder(r=3.5/2,h=100,center=true);
    translate([12,1+43,14])rotate([90,0,0])cylinder(r=8/2,h=100,center=true);
    translate([-12,1+43,14])rotate([90,0,0])cylinder(r=8/2,h=100,center=true);
}
*/
//translate([0,-15,-28-23])color("red")cylinder(r=1,h=50);



module torus(a,b){
R1=a;

R2=b;
    
RA=R1      /2;           // Radius   of  Torus
RB=R2      /2 - R1/2 ;     // Radius   of  Torus overall 

rotate_extrude(convexity = 10) // the value is the sides the finer
translate([RB, 0, 0])
circle(r = RA); // the value is the sides
}

module layerfan(){
translate([0,-15,-28-23+10])
rotate([0,0,0])
difference(){

    union(){
        translate([0,0,2])torus(9,60+10);
        translate([0,-35+11.5-5,0+15+50])cube([23,16,5+4],center=true);
        hull(){
            translate([0,-35+11.5-5,-5+15+2+50-6+4])cube([23+4+7,16+4,12],center=true);
            
            translate([0,-29,4+2])rotate([0,0,0])rotate([0,90,0])cylinder(r=8/2,h=23+4,center=true);
            
        }
        translate([12,-7-7-5+5,55+4])rotate([90,0,0])cylinder(r=7.5/2,h=010);
    translate([-12,-7-7-5+5,55+4])rotate([90,0,0])cylinder(r=7.5/2,h=10);


    }
    
translate([0,-30,55+4])rotate([90,0,0])cylinder(r=4/2,h=80,center=true);
    
    translate([0,2,-20])cylinder(r1=10,r2=28+5-2,h=20);
    translate([0,0,2])torus(6,60-2+10-2);
    //translate([12,-7,55])rotate([90,0,0])cylinder(r=3.5/2,h=30);
    //translate([-12,-7,55])rotate([90,0,0])cylinder(r=3.5/2,h=30);
    
    
        
        hull(){
            translate([0,-35+11.5-5,0+15+50])cube([19,12,5+10],center=true);
            //translate([0,-35+11.5,-5+15+2+50-6])cube([23+4+7,16+4,12],center=true);
            
            translate([0,-29,2])rotate([0,0,0])rotate([0,90,0])cylinder(r=5/2,h=23,center=true);
        }
    
}
}

//translate([-18.2,17.2,-49])rotate([90,0,0])color("blue")import("E3D_Volcano_1.75mm_0.8mm_Hotend_Assembly_fixed.STL");
